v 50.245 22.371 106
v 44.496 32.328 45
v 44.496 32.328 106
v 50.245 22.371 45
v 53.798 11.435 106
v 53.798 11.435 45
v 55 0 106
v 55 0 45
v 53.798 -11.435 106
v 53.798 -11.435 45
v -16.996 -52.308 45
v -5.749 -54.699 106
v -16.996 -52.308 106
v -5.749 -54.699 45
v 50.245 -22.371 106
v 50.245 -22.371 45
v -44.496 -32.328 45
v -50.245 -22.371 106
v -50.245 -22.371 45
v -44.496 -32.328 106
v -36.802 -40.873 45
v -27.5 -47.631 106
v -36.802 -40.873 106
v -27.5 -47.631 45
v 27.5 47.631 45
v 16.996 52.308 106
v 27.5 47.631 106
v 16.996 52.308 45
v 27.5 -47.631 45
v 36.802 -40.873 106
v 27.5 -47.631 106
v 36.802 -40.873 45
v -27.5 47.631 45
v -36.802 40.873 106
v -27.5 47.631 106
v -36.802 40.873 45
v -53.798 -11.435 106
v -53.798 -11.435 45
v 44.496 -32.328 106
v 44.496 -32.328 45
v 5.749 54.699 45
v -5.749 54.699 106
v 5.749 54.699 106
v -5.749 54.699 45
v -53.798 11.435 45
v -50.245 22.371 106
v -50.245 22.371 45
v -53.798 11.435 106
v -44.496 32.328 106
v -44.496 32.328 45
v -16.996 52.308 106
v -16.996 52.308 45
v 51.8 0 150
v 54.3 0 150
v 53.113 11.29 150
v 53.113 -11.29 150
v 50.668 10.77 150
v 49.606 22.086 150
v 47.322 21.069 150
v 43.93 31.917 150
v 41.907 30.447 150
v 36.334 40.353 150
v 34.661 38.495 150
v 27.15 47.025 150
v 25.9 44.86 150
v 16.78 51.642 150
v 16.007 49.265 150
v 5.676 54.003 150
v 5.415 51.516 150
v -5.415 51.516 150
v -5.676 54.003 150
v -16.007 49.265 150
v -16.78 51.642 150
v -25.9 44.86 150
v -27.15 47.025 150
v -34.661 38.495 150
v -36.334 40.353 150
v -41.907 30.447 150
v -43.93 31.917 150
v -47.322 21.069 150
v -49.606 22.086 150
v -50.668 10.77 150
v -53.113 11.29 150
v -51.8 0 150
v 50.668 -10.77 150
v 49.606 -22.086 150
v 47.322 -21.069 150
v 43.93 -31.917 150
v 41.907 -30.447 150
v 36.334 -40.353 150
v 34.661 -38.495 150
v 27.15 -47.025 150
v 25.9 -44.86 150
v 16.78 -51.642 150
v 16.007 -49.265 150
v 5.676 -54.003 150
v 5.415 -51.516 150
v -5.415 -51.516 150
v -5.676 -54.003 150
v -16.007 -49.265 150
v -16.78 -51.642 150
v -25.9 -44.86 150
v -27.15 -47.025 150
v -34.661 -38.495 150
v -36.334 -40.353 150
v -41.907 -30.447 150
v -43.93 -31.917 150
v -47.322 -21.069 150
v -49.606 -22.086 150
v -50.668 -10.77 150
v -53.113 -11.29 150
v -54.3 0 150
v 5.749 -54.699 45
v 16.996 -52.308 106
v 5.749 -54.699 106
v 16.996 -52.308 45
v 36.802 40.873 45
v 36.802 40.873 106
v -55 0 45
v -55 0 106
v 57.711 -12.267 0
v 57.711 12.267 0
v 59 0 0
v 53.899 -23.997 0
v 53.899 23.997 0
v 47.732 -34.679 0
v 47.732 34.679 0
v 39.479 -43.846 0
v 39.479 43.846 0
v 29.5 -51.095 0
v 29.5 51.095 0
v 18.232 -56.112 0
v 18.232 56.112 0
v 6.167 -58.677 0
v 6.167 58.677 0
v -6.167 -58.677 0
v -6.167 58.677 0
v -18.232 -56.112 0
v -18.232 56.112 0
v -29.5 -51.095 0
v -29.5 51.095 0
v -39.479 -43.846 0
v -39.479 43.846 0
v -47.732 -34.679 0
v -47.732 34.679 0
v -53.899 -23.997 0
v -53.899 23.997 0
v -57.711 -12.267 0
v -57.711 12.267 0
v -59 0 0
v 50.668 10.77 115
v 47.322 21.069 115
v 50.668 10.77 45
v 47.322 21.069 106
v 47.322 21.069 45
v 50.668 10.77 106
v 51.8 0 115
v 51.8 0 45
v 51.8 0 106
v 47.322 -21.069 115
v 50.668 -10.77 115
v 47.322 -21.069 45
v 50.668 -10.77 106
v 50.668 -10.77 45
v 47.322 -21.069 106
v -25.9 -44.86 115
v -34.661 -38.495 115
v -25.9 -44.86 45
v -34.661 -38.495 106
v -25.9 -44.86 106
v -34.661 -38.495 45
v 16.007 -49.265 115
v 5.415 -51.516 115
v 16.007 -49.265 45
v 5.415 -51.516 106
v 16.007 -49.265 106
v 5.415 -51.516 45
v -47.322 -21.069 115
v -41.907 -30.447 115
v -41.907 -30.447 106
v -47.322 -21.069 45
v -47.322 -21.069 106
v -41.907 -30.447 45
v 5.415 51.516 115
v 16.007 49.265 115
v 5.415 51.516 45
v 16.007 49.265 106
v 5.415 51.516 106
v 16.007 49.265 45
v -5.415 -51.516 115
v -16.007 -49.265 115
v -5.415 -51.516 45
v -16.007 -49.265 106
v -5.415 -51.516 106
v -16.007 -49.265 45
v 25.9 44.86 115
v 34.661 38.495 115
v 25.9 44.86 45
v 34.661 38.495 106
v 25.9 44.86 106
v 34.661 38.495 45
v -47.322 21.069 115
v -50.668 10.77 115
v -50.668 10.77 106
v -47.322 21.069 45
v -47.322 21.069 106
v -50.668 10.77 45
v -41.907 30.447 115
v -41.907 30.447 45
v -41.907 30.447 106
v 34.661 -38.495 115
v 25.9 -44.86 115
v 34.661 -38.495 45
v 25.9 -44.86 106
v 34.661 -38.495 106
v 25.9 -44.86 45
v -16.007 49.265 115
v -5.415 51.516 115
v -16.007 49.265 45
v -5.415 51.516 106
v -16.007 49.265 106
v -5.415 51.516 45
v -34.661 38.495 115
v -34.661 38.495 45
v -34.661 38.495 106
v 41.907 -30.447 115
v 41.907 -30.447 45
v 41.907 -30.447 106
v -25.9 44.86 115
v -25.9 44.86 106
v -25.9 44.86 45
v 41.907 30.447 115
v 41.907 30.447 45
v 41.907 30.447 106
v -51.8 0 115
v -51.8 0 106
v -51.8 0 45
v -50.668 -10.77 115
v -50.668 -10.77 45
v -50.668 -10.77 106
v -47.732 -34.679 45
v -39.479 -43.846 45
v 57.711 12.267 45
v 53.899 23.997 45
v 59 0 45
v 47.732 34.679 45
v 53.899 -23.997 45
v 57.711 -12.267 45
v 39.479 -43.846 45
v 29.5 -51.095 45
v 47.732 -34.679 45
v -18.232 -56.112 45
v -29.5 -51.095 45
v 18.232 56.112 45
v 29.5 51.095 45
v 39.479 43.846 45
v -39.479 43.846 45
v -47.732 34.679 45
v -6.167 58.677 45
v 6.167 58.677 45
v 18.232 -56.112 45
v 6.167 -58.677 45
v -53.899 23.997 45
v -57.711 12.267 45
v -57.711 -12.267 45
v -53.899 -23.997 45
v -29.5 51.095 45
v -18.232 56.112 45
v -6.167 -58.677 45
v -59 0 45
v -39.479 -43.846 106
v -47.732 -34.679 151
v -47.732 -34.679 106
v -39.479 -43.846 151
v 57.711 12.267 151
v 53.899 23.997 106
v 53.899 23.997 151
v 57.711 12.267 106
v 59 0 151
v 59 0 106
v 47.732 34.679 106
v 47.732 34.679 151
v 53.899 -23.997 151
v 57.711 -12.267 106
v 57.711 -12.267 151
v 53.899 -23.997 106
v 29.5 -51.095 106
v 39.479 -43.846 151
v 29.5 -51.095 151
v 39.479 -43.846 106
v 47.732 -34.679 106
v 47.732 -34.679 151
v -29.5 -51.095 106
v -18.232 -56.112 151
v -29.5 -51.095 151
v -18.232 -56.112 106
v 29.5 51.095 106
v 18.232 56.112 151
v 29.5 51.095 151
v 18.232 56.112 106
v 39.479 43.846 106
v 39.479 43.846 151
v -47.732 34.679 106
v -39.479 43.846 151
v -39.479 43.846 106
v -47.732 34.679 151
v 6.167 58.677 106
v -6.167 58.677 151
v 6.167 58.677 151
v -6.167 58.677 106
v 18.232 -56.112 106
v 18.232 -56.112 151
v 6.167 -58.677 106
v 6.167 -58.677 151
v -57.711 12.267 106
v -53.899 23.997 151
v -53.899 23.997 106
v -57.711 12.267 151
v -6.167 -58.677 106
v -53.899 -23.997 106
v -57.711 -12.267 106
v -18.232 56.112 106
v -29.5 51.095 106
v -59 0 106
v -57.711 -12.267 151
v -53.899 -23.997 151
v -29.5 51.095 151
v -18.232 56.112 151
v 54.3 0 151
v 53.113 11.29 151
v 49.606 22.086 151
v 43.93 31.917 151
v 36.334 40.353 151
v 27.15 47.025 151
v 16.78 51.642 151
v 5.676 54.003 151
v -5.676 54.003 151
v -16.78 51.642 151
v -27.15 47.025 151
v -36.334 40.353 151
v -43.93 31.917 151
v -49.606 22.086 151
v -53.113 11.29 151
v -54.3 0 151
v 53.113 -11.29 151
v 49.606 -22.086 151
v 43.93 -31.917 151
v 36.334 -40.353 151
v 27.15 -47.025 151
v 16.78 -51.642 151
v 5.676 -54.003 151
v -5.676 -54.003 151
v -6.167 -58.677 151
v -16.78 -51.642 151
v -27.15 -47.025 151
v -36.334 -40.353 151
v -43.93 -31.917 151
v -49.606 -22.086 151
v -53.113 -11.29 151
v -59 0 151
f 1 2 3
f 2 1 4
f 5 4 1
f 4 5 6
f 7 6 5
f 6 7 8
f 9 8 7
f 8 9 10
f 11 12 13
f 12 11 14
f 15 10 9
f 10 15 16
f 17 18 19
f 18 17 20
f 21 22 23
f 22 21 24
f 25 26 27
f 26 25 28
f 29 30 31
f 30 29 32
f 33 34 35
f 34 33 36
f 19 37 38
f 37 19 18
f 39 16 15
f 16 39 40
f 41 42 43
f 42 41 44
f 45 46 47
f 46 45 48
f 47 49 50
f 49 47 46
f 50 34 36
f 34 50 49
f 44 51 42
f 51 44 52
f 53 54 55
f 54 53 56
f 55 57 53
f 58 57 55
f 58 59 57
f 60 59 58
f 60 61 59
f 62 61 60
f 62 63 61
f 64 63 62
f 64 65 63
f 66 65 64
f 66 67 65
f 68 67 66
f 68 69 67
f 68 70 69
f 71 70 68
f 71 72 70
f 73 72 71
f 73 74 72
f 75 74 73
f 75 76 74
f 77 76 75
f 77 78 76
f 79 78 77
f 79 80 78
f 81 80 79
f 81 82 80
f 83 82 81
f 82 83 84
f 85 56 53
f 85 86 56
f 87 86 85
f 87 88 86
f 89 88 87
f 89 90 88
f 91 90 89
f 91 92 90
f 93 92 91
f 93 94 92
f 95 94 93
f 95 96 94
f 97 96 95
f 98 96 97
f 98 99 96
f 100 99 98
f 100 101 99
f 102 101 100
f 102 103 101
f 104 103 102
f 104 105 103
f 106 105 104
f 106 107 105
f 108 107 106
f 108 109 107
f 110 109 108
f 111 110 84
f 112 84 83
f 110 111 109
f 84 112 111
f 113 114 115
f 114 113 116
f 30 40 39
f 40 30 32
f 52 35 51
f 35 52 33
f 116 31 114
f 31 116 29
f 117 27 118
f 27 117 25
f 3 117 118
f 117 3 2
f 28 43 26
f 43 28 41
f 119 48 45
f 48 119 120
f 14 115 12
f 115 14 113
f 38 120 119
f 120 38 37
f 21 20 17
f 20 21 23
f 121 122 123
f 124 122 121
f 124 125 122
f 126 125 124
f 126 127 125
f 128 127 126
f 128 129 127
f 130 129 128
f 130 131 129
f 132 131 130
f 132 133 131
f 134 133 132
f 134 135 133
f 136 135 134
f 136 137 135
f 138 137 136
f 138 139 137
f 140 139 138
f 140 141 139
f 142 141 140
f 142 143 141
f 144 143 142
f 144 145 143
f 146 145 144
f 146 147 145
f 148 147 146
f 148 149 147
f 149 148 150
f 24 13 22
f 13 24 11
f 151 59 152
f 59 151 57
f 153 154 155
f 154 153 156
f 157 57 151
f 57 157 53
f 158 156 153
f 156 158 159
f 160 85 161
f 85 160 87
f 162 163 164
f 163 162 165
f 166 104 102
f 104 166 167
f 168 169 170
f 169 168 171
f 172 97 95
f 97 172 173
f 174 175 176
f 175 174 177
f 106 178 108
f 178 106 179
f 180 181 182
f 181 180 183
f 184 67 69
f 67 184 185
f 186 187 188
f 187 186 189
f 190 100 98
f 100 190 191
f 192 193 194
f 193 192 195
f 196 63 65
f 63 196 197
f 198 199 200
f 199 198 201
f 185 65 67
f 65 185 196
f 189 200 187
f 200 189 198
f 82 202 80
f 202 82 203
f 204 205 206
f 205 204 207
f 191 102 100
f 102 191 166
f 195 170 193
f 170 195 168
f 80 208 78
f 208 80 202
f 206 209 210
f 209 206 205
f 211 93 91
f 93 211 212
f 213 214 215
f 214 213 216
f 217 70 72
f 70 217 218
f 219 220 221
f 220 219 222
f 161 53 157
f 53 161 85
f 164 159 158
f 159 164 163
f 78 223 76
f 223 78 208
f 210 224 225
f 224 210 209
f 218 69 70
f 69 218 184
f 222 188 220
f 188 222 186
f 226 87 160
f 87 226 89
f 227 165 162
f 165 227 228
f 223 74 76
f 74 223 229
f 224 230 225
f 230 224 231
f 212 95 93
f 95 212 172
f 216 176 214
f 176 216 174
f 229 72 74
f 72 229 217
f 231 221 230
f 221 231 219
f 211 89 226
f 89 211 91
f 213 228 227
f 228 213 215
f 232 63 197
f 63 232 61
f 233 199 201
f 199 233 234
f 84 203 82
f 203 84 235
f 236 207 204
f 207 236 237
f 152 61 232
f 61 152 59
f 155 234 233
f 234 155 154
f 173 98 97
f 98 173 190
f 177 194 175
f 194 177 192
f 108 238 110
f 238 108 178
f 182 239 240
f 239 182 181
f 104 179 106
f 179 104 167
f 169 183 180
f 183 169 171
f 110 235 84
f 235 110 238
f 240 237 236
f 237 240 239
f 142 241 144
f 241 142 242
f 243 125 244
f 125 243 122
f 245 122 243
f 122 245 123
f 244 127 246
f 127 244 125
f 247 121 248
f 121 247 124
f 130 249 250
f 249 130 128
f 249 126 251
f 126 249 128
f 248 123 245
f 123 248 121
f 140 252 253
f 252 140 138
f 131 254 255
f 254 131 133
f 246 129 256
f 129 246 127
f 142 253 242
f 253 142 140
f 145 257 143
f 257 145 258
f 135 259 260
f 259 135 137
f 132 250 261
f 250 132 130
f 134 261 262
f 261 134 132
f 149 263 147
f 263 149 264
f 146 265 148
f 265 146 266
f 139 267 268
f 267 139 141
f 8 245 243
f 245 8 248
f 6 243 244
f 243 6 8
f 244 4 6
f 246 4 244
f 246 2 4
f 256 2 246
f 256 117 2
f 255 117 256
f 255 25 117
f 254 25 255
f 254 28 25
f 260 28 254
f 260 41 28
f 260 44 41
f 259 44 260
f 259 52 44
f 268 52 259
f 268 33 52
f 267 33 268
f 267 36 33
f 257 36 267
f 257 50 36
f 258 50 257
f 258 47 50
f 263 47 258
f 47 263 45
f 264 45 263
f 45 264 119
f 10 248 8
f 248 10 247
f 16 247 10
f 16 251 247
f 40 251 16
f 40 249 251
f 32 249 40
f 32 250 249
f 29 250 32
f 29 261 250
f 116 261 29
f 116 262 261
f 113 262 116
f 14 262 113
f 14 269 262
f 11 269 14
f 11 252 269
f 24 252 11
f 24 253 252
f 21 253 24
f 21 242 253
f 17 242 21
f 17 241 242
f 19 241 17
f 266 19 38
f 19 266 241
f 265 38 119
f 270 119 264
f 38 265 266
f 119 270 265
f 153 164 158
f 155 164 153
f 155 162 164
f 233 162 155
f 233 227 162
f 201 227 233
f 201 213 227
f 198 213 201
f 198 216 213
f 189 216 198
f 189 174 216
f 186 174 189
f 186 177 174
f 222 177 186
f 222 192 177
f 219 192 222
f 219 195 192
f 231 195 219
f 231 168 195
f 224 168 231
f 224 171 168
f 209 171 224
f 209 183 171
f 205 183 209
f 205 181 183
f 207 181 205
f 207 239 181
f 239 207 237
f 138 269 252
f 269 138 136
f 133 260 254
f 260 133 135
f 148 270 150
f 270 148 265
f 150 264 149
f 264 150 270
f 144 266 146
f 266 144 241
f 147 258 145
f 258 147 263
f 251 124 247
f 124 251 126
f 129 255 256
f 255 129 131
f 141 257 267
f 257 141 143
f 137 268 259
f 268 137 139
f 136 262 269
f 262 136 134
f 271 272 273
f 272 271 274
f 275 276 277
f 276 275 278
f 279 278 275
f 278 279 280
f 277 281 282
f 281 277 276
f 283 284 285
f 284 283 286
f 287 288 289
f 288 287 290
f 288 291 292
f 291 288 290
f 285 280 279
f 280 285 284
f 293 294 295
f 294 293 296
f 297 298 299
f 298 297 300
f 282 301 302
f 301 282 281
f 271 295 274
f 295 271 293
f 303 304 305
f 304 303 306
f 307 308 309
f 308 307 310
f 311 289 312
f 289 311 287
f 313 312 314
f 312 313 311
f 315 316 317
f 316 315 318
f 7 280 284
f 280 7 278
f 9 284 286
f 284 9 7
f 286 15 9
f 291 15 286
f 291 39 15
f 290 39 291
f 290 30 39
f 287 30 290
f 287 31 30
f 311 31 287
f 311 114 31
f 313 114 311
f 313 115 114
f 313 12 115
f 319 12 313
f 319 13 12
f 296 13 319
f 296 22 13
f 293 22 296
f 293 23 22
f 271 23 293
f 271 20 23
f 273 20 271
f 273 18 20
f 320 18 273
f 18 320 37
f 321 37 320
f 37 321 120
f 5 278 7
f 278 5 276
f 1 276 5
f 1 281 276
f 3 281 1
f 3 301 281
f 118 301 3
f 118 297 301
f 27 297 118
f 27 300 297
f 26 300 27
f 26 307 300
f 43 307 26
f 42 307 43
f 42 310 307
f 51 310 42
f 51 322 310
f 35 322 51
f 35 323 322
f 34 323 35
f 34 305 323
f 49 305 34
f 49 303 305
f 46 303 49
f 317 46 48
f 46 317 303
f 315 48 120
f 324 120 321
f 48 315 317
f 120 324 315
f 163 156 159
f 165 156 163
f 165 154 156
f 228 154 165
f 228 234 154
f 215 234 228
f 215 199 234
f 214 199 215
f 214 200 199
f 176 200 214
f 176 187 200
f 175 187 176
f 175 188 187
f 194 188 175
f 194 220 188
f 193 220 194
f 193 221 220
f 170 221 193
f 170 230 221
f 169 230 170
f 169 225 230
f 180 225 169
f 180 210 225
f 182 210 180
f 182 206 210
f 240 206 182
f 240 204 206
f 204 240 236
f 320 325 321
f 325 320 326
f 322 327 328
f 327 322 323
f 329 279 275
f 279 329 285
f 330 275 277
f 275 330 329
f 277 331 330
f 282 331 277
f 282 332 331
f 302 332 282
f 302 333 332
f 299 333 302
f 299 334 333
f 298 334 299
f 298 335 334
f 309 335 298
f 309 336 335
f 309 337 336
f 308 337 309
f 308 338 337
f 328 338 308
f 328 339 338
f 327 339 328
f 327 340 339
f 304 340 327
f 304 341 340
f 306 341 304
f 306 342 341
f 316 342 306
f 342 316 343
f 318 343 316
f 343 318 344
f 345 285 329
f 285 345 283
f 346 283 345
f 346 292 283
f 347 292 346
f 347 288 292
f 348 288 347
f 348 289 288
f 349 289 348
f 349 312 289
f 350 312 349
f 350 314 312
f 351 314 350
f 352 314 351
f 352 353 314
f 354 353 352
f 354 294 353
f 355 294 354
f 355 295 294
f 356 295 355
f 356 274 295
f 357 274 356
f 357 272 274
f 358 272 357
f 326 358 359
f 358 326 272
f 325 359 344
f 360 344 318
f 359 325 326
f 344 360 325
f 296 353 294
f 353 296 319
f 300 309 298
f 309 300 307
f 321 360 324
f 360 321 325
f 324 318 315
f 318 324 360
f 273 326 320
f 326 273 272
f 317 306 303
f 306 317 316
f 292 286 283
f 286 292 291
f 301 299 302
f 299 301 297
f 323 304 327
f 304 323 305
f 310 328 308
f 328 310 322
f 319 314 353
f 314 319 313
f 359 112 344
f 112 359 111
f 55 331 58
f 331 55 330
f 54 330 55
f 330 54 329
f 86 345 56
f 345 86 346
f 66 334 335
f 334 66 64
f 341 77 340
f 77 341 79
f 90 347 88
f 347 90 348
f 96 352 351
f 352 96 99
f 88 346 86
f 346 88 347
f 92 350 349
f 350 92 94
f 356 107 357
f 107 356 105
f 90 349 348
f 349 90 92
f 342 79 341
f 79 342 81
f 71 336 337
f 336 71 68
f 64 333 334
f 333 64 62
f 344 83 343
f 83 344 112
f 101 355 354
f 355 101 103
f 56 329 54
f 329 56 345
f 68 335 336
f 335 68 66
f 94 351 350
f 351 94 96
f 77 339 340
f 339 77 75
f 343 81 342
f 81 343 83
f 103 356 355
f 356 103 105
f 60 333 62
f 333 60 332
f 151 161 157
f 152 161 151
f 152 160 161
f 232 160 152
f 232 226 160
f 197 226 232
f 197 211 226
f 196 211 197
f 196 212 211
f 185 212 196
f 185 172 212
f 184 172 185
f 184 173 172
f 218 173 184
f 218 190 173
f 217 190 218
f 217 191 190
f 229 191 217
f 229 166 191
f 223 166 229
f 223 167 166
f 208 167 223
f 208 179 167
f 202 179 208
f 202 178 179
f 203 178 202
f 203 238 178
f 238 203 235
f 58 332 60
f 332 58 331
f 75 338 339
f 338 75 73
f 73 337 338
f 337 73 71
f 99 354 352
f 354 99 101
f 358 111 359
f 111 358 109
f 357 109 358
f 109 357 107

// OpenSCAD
// Parameters
pipe_standard = 1; //[1:1:1]
nominal_diameter = 110; //[55:220:1]
length_mm = 150; //[75:300:1]
pipe_od = 110; //[55:220:1]
wall_thickness = 3.2; //[1.6:6.4:0.1]
fitting_length = 45; //[25:90:1]
fitting_od_increase = 8; //[4:16:0.5]
fitting_wall_extra = 1.5; //[0.5:4:0.1]
socket_depth = 35; //[15:70:1]
overlap = 1; //[0.5:2:0.1]

// Module for the HT Pipe
module ht_pipe() {
  color([0.85, 0.85, 0.8]) {
    // Pipe body
    difference() {
      cylinder(h=length_mm, r=pipe_od/2, center=false);
      translate([0, 0, -overlap])
        cylinder(h=length_mm + overlap*2, r=pipe_od/2 - wall_thickness, center=false);
    }
    
    // End fitting
    difference() {
      union() {
        cylinder(h=fitting_length, r=pipe_od/2 + fitting_od_increase/2, center=false);
        translate([0, 0, length_mm - fitting_length + overlap])
          cylinder(h=fitting_length, r=pipe_od/2 + fitting_od_increase/2, center=false);
      }
      translate([0, 0, length_mm - socket_depth])
        cylinder(h=socket_depth + overlap, r=pipe_od/2 + fitting_od_increase/2 - (wall_thickness + fitting_wall_extra), center=false);
    }
  }
}

// Assembly
module assembly() {
  ht_pipe();
}

assembly();
